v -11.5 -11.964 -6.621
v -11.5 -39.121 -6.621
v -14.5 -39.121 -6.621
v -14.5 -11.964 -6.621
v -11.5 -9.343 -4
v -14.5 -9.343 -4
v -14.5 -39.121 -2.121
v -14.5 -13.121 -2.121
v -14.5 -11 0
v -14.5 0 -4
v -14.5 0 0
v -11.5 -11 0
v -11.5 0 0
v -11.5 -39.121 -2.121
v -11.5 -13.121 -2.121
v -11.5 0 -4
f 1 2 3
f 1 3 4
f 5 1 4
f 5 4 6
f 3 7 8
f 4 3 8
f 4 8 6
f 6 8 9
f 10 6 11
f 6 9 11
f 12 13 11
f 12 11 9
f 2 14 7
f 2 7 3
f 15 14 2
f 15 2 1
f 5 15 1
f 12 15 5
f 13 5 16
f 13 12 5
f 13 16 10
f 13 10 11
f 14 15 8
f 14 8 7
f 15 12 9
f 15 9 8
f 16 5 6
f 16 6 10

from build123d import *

# Parameters (mm, degrees)
F2_DEPTH = 3


with BuildPart() as f2:
    # F1 (on offset) → F2 (new body)
    with BuildSketch(Plane.YZ.offset(-11.5)):
        Polygon((0, -4), (0, 0), (-11, 0), (-13.12132, -2.12132), (-39.12132, -2.12132), (-39.12132, -6.62132), (-11.964466, -6.62132), (-9.343146, -4), align=None)
    extrude(amount=-F2_DEPTH)


solid = f2.part
